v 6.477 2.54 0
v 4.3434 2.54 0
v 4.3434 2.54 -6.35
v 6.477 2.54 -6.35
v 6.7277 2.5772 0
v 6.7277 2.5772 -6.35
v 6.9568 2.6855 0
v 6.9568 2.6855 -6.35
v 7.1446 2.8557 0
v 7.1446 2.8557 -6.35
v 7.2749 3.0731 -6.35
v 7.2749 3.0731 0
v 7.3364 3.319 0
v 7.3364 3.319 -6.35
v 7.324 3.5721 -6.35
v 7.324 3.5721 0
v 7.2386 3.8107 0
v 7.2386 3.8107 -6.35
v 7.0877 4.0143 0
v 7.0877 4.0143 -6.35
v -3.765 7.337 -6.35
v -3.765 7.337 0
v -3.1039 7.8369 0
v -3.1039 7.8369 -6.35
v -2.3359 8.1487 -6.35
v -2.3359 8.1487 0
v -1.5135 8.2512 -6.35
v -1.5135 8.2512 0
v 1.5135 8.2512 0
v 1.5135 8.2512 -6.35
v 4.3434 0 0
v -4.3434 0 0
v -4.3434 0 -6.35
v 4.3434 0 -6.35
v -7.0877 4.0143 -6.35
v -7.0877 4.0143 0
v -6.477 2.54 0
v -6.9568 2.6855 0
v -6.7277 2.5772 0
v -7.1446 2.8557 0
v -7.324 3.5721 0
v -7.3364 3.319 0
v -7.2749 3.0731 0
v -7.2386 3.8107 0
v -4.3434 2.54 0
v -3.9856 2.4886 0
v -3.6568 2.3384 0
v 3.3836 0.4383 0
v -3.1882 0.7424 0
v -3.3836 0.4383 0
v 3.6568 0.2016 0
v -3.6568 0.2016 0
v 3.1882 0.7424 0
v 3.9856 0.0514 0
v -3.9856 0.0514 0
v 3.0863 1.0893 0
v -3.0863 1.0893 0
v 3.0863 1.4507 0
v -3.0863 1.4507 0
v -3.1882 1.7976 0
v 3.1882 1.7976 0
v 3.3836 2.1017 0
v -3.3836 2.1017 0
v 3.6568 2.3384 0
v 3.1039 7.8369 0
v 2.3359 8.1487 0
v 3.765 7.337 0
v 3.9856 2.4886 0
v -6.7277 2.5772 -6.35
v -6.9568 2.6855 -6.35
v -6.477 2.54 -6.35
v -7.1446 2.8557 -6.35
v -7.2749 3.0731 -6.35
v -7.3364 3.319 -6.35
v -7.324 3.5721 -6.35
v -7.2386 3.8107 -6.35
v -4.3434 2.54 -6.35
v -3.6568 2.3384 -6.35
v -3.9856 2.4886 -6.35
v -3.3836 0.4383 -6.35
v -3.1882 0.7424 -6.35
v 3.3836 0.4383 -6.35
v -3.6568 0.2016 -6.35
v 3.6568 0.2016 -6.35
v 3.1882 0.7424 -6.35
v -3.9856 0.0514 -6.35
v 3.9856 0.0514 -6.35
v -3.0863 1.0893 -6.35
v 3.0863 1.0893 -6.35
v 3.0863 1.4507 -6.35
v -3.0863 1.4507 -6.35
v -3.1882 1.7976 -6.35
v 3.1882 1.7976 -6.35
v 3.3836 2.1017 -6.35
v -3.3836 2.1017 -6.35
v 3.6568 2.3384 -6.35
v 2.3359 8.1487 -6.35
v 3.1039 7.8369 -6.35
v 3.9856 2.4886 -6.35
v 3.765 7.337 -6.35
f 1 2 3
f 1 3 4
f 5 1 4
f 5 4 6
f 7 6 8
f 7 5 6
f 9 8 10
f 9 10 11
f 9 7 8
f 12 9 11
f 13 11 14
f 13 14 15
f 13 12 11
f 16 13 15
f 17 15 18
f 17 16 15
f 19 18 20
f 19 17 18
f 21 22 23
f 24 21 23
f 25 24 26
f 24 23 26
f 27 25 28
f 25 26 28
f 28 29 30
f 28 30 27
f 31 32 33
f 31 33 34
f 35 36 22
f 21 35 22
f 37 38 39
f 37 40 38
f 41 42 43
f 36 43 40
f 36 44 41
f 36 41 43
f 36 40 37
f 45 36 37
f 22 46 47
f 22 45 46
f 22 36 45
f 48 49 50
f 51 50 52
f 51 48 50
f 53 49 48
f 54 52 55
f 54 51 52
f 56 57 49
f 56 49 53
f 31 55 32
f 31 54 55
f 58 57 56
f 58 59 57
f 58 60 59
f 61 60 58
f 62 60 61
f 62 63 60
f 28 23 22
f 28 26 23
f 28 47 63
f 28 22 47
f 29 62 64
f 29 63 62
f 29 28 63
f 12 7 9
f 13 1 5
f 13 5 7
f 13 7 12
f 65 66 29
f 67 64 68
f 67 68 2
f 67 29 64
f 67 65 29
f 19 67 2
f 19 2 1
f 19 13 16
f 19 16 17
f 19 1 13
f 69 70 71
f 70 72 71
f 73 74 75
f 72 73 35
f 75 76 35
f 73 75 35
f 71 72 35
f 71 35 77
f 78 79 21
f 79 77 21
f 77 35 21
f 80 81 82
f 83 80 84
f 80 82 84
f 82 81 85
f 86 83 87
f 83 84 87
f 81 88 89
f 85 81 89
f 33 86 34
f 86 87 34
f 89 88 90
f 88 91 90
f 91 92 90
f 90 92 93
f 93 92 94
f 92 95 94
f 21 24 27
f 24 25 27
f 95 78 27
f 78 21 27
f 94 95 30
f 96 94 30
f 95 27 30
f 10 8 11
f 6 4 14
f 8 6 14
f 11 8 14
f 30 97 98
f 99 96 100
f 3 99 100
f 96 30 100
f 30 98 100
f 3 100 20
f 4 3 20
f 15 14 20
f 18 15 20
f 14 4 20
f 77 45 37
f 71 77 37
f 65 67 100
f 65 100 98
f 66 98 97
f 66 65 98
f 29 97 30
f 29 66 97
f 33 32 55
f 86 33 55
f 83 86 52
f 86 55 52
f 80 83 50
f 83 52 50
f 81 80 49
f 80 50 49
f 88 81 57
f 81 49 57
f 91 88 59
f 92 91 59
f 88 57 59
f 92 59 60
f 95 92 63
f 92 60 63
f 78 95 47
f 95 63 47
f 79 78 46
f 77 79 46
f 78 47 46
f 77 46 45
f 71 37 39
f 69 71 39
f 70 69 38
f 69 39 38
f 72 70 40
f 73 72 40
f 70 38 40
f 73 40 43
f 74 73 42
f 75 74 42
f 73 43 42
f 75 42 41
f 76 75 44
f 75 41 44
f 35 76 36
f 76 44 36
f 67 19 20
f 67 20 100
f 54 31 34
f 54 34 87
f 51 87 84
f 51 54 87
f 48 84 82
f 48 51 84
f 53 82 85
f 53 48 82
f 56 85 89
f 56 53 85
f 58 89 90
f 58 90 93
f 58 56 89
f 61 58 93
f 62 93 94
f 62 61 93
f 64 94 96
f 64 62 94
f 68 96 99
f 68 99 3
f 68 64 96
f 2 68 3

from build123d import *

# Parameters (mm, degrees)
BOSS_EXTRUDE1_DEPTH = 6.35


with BuildPart() as part:
    # Sketch1 → Boss-Extrude1 (new body)
    with BuildSketch(Plane.XY):
        with BuildLine():
            Line((0, 0), (-4.3434, 0))
            ThreePointArc((-4.3434, 0), (-3.0734, 1.27), (-4.3434, 2.54))
            Line((-4.3434, 2.54), (-6.477, 2.54))
            ThreePointArc((-6.477, 2.54), (-7.274862364, 3.073114588), (-7.087657416, 4.014257416))
            Line((-7.087657416, 4.014257416), (-3.764962651, 7.336952181))
            ThreePointArc((-3.764962651, 7.336952181), (-2.730139224, 8.017998618), (-1.513461851, 8.2511937))
            Line((-1.513461851, 8.2511937), (0, 8.2511937))
            Line((0, 8.2511937), (0, 0))
        make_face()
    boss_extrude1 = extrude(amount=-BOSS_EXTRUDE1_DEPTH)

    # Mirror1: Boss-Extrude1 across plane
    add(boss_extrude1.mirror(Plane(origin=(0, 0, 0), x_dir=(0, 0, 1), z_dir=(1, 0, 0))))


solid = part.part
